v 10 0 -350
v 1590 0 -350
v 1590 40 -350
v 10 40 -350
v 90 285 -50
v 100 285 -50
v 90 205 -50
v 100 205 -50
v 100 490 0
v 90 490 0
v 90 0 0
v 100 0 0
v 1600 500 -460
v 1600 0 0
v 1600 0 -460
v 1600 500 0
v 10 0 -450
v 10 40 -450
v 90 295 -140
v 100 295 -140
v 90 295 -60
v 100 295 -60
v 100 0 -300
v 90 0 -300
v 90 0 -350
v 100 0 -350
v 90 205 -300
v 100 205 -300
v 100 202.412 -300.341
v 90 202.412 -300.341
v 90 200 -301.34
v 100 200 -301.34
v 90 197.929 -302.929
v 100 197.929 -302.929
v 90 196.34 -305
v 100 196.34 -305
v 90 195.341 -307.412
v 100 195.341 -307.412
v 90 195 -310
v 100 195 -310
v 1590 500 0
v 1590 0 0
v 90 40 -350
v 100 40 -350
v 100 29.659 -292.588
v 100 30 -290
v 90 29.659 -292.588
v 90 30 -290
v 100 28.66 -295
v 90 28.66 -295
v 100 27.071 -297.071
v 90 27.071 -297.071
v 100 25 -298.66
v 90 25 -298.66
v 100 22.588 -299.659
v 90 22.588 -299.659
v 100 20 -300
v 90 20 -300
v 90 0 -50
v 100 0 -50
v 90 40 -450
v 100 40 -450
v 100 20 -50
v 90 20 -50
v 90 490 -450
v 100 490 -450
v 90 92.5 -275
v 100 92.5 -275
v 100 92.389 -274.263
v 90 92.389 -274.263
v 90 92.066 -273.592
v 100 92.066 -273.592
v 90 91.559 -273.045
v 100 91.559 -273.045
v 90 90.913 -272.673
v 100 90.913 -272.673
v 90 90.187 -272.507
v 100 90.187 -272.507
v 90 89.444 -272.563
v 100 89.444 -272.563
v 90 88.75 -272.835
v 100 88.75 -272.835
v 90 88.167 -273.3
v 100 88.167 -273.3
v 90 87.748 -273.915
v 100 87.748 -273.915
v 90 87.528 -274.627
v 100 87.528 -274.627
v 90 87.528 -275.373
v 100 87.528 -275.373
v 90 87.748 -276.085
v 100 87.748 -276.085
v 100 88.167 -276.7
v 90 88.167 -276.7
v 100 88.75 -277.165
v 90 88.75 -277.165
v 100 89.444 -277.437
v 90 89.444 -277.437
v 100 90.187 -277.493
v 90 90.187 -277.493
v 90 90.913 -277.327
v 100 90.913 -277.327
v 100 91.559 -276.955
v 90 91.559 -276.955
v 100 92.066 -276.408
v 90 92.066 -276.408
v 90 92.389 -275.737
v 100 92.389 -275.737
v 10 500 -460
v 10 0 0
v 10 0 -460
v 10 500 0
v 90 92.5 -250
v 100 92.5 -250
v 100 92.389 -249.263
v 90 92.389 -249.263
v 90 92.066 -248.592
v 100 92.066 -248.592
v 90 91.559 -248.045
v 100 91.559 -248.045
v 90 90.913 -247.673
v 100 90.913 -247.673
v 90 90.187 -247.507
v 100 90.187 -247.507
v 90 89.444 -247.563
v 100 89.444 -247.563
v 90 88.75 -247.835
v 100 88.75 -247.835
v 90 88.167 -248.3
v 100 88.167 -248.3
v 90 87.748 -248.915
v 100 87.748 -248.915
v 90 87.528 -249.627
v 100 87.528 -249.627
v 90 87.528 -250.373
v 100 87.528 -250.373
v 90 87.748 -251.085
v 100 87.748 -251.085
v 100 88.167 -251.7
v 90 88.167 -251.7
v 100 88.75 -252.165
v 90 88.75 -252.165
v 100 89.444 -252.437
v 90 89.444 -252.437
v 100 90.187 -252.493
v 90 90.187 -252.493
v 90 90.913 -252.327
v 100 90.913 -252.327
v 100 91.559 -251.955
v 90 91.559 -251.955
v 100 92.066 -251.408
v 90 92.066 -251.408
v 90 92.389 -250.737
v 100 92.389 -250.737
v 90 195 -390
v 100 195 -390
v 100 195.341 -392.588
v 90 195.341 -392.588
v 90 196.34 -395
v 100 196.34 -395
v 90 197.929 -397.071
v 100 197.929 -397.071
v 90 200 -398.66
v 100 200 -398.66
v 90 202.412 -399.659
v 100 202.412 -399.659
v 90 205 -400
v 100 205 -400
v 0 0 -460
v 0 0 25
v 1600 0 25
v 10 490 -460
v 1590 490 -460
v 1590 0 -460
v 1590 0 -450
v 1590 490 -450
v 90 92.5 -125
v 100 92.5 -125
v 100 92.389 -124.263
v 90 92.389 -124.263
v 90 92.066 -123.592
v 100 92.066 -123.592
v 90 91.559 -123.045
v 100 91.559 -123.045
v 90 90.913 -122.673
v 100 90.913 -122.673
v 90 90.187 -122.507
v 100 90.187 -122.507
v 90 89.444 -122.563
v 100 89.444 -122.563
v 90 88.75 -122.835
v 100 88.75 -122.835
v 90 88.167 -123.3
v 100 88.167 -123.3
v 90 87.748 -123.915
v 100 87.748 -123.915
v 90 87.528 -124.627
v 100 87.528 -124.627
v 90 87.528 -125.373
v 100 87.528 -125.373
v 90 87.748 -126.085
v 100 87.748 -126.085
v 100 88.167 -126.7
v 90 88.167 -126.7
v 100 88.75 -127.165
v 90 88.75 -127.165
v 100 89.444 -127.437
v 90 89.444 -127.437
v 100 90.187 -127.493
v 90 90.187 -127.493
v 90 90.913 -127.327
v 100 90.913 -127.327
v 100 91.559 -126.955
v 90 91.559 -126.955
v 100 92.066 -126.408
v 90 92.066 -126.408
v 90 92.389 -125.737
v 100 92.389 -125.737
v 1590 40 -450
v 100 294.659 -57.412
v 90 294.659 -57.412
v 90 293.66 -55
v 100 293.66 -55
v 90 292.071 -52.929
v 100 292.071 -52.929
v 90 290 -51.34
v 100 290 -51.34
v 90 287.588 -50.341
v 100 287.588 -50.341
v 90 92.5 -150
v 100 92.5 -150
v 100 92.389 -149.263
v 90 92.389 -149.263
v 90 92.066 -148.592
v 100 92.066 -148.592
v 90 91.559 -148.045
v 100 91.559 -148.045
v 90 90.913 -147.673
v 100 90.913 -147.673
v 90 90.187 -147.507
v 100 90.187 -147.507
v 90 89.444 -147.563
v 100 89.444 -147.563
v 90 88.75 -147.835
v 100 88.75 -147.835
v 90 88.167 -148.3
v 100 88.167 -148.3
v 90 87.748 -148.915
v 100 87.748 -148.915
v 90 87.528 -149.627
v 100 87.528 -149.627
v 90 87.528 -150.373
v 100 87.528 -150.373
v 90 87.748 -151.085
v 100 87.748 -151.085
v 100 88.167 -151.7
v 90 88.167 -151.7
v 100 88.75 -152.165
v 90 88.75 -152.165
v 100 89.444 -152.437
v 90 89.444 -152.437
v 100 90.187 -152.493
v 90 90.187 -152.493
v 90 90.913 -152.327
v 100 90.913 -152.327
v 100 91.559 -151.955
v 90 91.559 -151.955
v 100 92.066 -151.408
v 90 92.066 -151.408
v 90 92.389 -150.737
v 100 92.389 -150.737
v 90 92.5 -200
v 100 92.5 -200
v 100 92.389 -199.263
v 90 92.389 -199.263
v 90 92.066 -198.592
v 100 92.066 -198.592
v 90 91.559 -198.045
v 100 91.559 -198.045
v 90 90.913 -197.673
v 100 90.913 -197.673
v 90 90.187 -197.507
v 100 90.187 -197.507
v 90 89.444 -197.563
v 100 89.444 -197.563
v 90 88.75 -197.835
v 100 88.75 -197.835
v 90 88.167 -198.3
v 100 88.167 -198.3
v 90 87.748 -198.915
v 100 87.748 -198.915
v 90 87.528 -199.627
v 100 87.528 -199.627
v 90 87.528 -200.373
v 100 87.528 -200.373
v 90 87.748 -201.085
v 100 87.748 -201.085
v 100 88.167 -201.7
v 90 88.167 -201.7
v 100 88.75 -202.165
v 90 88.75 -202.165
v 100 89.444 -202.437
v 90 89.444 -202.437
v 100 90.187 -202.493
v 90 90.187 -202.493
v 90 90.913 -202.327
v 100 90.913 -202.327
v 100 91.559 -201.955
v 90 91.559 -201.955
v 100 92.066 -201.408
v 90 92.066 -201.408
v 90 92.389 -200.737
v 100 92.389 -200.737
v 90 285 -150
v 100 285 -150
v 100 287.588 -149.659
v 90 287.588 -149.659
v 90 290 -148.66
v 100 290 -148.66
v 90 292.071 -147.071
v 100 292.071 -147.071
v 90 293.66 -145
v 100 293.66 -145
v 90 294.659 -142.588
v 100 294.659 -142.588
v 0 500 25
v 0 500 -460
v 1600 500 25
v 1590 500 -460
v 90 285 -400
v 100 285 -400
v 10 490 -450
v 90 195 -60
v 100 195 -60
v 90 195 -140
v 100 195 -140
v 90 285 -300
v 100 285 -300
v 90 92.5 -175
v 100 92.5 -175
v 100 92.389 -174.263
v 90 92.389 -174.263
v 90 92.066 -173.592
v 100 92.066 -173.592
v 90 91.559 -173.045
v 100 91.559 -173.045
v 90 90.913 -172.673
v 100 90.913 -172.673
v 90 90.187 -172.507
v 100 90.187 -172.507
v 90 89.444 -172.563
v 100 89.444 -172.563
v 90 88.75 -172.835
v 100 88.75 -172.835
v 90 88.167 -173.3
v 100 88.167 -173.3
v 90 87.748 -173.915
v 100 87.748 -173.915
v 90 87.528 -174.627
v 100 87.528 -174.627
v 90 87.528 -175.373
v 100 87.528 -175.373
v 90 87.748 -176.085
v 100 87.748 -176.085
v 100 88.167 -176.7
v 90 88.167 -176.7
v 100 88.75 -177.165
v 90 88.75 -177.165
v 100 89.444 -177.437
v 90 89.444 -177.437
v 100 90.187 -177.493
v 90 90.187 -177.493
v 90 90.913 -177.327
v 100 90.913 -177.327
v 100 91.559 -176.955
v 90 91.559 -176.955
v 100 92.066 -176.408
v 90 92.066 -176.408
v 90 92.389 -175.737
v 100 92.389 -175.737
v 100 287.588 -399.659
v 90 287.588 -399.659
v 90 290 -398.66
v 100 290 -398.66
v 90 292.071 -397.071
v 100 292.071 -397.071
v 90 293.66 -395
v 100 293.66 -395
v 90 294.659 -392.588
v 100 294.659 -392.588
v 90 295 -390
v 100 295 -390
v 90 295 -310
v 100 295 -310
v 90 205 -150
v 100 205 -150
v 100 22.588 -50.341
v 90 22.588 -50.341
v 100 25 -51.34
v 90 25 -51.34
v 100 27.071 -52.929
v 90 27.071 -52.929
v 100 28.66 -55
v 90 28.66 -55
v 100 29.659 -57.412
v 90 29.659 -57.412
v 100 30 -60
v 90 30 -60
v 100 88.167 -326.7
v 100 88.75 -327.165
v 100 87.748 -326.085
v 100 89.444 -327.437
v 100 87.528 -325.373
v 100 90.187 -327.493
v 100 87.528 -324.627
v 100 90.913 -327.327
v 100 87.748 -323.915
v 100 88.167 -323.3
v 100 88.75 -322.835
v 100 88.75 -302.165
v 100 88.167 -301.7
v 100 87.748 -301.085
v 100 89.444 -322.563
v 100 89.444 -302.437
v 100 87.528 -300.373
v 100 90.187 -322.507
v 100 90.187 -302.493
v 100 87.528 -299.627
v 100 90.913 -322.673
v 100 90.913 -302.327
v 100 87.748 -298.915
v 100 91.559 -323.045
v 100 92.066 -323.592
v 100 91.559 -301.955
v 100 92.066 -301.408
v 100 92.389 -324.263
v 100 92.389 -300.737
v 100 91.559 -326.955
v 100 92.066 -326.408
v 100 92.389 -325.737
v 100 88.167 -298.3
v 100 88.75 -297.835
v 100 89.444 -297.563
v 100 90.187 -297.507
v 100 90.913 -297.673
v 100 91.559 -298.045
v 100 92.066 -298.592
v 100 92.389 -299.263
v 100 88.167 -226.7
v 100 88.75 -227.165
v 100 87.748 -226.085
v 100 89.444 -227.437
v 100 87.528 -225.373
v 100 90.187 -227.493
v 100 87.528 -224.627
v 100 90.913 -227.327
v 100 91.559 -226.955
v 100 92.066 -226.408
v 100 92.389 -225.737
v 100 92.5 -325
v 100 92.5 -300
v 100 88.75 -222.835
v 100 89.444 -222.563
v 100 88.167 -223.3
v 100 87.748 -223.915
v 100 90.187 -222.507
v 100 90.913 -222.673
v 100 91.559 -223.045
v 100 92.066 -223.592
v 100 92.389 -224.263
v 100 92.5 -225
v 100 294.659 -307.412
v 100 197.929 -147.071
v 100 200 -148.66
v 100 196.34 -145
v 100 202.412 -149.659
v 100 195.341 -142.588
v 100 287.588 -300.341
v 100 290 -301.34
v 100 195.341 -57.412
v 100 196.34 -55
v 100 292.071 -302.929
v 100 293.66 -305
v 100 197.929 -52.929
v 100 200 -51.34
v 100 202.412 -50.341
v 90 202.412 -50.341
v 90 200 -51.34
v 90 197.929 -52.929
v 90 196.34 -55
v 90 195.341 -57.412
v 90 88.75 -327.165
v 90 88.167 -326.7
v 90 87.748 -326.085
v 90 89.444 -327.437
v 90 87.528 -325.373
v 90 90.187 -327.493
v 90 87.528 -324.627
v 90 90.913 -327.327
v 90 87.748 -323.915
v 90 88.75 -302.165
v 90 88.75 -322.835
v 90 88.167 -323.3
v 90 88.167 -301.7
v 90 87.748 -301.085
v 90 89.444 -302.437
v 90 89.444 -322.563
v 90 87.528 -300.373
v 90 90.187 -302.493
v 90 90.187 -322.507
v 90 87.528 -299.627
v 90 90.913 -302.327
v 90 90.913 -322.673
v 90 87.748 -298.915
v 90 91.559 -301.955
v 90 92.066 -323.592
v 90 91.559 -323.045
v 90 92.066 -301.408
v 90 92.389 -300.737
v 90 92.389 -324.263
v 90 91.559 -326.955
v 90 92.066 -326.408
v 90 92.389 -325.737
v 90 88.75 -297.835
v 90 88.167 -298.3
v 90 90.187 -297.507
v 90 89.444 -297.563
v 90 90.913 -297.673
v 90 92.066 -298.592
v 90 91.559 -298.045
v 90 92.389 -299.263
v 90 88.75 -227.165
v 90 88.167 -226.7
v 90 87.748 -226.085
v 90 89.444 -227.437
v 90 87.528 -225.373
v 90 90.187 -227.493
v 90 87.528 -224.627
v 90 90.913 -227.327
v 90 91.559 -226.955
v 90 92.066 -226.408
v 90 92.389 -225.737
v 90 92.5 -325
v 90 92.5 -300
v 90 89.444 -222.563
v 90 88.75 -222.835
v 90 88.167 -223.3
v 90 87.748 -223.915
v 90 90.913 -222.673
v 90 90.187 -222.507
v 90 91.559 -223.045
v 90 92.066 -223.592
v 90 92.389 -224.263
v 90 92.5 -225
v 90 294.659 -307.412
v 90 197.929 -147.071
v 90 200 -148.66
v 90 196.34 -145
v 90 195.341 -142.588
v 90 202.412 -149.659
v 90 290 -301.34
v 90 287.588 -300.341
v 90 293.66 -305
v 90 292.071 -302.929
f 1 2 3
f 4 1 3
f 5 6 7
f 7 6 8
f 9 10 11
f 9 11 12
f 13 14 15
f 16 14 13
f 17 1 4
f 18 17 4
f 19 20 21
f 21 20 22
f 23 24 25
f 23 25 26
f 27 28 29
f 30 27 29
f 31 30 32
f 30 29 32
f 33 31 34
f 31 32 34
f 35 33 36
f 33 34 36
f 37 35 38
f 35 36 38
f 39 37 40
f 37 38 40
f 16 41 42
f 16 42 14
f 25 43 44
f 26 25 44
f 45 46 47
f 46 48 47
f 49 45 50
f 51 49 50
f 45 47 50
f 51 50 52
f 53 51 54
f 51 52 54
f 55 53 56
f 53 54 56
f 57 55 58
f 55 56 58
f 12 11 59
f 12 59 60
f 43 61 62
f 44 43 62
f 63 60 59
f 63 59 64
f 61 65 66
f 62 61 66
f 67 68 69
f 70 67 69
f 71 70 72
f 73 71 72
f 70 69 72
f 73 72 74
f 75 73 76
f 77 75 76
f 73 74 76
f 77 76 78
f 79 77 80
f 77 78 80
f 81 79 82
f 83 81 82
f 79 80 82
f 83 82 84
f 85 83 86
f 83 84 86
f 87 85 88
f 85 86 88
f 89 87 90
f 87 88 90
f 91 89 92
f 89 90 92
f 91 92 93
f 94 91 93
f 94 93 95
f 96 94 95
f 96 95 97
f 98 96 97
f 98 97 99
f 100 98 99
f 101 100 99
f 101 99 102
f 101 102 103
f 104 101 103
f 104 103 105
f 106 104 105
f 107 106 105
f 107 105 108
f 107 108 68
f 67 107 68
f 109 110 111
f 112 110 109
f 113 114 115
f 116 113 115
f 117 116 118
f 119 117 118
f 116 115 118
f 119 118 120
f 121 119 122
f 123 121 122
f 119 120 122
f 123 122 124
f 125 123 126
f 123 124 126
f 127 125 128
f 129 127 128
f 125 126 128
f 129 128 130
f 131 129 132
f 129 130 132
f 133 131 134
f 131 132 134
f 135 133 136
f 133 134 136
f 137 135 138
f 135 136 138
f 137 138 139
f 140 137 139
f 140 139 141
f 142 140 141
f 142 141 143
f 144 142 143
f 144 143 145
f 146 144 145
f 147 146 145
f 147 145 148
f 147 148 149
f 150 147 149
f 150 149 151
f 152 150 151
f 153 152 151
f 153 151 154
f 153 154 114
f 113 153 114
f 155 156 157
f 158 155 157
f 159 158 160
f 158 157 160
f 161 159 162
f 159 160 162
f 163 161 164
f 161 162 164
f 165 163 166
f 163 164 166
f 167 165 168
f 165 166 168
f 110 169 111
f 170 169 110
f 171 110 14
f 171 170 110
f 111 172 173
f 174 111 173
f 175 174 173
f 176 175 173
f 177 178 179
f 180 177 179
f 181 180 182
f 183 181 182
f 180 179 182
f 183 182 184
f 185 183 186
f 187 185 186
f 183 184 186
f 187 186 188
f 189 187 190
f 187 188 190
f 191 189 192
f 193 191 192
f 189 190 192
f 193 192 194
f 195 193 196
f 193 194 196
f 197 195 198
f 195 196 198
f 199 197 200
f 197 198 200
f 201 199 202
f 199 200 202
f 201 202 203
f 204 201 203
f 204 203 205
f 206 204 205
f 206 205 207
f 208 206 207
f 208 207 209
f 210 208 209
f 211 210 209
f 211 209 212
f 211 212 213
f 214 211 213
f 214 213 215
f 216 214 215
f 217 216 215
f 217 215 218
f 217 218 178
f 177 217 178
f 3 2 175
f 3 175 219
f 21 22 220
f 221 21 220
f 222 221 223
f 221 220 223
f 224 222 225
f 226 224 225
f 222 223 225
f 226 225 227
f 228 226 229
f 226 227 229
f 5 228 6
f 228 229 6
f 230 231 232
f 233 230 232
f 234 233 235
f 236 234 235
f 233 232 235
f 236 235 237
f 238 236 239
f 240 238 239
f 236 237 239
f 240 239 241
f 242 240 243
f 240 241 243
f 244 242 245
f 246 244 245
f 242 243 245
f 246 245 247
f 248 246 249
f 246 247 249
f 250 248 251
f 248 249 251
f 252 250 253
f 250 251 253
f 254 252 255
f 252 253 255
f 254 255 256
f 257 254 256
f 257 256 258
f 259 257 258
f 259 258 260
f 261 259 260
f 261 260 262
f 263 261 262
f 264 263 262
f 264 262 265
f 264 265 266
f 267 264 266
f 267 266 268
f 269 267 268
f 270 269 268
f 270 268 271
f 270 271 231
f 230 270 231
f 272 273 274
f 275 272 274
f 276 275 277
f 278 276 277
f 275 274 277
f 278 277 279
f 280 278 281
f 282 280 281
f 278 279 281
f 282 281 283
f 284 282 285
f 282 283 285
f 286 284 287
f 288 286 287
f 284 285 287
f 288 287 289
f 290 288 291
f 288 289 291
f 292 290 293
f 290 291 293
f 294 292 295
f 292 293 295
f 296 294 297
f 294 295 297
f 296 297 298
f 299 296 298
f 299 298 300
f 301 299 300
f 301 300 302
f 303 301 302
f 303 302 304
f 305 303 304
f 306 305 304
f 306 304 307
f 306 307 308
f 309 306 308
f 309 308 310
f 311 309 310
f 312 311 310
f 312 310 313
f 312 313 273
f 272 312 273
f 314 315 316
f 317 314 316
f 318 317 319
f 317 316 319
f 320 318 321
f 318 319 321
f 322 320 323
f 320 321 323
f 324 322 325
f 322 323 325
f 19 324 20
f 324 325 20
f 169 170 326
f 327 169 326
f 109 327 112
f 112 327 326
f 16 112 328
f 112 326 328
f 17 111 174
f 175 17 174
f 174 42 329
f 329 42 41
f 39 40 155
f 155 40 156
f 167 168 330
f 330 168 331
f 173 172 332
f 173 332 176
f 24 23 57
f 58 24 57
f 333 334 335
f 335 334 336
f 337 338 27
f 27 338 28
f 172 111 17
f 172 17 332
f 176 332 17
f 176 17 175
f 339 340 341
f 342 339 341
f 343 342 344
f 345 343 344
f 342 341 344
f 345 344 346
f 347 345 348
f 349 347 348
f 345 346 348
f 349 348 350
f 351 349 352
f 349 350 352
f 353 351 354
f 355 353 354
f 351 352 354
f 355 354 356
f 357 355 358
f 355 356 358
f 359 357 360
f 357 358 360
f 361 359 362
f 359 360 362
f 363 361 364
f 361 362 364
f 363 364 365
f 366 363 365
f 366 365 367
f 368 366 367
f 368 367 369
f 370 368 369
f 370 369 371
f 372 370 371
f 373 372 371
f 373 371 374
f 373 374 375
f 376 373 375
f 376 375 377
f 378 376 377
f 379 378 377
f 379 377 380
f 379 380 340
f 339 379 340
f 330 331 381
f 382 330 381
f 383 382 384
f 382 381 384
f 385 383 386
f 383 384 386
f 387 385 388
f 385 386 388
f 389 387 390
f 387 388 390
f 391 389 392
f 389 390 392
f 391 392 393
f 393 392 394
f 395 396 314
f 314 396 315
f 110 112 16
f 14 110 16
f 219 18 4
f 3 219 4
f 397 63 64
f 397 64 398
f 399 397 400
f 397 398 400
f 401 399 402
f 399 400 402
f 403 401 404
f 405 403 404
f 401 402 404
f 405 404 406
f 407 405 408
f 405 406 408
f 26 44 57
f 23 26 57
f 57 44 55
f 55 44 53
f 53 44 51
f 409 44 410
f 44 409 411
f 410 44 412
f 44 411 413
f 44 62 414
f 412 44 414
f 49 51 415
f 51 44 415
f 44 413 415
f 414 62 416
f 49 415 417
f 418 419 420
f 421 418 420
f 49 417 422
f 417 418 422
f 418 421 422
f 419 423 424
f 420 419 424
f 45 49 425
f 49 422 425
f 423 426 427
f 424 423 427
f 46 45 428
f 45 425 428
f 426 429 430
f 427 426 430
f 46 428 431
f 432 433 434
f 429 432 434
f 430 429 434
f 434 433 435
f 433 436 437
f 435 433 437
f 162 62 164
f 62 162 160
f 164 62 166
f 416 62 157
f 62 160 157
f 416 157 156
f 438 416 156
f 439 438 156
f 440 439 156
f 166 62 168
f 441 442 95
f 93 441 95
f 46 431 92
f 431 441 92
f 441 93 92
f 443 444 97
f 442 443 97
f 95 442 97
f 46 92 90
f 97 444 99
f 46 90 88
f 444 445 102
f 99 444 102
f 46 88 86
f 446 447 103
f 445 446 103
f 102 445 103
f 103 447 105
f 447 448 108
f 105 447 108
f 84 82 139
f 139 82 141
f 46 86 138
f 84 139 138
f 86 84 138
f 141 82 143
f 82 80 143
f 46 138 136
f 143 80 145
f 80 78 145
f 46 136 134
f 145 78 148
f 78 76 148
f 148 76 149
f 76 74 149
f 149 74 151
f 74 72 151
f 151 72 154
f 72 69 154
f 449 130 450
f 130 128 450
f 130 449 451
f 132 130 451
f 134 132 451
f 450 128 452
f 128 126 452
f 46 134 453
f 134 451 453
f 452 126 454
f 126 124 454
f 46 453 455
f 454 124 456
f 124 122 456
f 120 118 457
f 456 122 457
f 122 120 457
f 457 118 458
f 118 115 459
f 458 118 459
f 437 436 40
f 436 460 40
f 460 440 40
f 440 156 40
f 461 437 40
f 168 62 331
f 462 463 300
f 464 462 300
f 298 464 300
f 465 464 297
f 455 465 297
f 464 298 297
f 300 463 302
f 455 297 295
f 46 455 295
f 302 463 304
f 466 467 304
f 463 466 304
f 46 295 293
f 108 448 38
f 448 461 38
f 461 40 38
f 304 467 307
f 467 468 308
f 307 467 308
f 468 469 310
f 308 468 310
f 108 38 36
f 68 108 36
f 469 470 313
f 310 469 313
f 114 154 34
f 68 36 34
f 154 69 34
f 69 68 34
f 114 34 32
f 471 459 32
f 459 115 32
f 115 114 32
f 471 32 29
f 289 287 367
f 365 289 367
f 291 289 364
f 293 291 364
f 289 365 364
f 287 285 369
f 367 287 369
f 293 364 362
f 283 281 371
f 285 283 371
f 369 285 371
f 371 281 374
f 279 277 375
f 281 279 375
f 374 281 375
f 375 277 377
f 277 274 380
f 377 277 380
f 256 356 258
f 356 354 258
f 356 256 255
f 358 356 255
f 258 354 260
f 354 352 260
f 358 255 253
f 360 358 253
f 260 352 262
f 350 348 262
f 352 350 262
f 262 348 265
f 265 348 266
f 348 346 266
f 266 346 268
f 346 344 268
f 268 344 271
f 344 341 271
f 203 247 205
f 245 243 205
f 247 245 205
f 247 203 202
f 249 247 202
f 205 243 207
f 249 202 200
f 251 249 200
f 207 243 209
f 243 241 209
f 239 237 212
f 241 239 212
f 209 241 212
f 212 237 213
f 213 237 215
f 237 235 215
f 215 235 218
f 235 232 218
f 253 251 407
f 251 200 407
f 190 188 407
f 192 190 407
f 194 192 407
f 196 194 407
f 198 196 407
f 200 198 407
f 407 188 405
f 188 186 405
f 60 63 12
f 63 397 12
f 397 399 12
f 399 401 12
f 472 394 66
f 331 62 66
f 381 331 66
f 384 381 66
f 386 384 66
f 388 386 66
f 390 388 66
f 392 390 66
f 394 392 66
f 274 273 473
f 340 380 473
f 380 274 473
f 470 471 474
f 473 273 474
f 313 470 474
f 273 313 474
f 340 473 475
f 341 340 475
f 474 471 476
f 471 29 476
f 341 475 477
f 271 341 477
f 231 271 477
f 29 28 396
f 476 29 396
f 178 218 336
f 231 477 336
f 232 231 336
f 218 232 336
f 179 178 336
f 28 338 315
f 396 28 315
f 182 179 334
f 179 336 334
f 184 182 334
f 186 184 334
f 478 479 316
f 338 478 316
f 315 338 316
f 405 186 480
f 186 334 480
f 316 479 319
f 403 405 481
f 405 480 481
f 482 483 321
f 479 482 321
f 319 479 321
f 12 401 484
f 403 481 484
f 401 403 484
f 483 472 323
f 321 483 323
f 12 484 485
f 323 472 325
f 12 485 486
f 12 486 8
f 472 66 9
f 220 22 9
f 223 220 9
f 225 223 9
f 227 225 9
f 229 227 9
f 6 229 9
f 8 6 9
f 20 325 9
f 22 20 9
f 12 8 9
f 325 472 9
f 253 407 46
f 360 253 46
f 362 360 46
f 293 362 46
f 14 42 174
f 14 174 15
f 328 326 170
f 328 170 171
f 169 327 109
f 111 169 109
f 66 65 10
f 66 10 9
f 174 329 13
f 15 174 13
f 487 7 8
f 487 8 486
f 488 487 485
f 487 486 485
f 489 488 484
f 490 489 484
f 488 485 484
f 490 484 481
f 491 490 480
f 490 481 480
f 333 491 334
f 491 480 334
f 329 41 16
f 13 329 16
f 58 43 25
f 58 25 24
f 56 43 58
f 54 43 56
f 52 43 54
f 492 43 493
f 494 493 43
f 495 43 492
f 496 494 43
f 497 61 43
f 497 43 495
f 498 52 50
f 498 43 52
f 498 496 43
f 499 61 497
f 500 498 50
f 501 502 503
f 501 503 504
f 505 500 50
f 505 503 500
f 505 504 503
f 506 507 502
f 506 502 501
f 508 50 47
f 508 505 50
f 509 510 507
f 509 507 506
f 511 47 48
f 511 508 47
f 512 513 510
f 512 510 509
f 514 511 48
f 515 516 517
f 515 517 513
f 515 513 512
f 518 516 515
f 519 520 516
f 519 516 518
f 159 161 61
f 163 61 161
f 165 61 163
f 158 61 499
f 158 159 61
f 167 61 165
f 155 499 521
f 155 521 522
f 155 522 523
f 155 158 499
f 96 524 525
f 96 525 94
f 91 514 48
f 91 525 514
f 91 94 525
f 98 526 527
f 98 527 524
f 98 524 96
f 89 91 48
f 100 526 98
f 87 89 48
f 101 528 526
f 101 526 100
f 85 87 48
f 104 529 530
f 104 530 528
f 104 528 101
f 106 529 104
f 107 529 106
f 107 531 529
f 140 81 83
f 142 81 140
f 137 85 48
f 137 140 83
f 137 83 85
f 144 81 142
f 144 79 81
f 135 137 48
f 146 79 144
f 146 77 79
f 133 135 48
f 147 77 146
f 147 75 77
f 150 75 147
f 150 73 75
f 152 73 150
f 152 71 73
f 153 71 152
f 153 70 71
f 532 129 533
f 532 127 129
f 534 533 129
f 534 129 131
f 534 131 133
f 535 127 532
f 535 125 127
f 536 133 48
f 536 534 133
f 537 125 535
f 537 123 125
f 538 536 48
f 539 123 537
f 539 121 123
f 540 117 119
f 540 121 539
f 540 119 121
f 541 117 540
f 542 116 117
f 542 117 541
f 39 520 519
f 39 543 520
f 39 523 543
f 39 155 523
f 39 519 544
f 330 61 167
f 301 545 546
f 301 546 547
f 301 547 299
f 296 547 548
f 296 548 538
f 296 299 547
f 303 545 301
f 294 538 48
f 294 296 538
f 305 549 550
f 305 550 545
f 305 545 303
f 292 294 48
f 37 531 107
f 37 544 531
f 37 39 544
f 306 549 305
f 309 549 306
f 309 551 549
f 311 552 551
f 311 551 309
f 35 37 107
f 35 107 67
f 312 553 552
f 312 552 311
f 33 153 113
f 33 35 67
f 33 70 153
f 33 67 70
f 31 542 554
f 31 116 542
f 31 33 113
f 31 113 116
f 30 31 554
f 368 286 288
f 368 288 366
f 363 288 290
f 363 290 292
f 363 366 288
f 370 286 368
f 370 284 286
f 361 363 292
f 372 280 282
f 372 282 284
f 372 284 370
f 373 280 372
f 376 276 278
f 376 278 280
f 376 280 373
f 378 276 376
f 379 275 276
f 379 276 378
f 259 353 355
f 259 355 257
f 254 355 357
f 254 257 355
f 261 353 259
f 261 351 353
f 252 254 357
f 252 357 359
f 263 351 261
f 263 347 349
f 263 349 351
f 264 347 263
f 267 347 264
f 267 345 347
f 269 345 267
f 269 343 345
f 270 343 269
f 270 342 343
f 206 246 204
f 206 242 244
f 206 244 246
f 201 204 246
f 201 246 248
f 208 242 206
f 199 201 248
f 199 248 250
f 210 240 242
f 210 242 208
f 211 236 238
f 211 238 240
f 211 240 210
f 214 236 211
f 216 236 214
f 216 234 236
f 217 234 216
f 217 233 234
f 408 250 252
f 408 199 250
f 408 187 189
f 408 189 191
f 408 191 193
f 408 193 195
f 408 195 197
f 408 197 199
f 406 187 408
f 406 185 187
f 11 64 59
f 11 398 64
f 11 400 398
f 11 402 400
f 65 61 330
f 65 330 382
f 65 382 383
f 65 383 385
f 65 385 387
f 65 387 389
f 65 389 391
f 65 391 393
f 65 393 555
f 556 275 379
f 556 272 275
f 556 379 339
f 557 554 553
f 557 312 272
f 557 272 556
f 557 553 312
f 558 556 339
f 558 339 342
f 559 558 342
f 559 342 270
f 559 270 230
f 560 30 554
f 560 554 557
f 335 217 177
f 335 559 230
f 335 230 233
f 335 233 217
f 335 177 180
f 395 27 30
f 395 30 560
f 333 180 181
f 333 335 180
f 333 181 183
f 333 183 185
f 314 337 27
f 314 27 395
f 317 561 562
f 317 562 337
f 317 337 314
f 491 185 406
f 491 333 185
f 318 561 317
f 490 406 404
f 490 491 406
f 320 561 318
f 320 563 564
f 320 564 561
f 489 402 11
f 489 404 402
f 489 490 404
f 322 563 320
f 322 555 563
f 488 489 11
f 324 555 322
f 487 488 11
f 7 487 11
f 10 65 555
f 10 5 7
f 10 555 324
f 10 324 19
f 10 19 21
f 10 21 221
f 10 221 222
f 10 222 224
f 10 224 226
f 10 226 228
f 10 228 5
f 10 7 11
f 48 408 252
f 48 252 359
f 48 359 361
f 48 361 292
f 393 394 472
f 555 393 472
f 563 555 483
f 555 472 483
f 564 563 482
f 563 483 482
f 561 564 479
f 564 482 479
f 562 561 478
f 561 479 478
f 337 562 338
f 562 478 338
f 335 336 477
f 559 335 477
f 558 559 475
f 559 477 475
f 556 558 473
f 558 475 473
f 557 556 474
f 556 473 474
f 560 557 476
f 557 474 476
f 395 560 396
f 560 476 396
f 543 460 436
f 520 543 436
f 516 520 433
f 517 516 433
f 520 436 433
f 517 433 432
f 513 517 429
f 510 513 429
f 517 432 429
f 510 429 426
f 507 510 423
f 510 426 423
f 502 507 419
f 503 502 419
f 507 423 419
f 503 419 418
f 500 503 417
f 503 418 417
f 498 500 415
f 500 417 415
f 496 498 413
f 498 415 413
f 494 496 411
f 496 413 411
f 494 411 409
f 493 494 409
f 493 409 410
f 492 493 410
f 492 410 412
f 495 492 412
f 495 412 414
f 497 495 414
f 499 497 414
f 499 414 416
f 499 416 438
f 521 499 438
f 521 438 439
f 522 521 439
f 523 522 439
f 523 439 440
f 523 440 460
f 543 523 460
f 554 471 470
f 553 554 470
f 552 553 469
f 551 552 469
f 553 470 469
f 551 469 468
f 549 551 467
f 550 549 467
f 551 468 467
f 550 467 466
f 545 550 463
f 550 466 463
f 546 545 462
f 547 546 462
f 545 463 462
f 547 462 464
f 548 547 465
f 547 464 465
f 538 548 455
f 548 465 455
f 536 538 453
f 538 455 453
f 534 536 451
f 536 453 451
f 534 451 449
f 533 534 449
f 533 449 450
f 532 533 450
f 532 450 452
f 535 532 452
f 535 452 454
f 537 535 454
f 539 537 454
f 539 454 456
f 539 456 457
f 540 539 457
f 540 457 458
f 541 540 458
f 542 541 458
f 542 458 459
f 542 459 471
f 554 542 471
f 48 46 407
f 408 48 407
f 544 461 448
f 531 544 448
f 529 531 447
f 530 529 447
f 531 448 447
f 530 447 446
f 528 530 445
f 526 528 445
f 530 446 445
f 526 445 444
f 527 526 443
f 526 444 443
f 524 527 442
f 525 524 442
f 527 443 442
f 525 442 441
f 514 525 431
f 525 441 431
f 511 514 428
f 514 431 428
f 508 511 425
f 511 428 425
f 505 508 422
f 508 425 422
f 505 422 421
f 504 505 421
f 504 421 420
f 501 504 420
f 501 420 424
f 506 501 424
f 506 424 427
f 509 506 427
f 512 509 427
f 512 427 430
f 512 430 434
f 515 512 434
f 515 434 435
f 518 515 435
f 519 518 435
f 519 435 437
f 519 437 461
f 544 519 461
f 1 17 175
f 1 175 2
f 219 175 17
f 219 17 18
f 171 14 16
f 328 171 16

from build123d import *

# Parameters (mm, degrees)
F0_W      = 1600
F0_H      = 500
F1_DEPTH  = 25
F3_W      = 1580
F3_H      = 490
F4_DEPTH  = 10
F5_W      = 10
F5_H      = 500
F6_DEPTH  = 460
F7_W      = 10
F7_H      = 500
F8_DEPTH  = 460
F9_W      = 40
F9_H      = 100
F10_DEPTH = 1580
F11_W     = 10
F11_H     = 450
F12_DEPTH = 450
F13_W     = 10
F13_H     = 350
F14_DEPTH = 40
F16_W     = 30
F16_H     = 250
F17_DEPTH = 100.001
F18_R     = 10
F20_DEPTH = 100.001
F21_R     = 2.5
F22_DEPTH = 100.001


with BuildPart() as f1:
    # F0 (on Top) → F1 (new body)
    with BuildSketch(Plane.XY):
        with Locations((800, 250)):
            Rectangle(F0_W, F0_H)
    extrude(amount=F1_DEPTH)

    # F5 (on face) → F6 (join, through all)
    with BuildSketch(Plane.XY):
        with Locations((5, 250)):
            Rectangle(F5_W, F5_H)
    extrude(amount=-F6_DEPTH)


with BuildPart() as f4:
    # F3 (on offset) → F4 (new body)
    with BuildSketch(Plane.XY.offset(-460)):
        with Locations((800, 245)):
            Rectangle(F3_W, F3_H)
    extrude(amount=F4_DEPTH)


with BuildPart() as f8:
    # F7 (on face) → F8 (new body, through all)
    with BuildSketch(Plane.XY):
        with Locations((1595, 250)):
            Rectangle(F7_W, F7_H)
    extrude(amount=-F8_DEPTH)


with BuildPart() as f10:
    # F9 (on face) → F10 (new body, through all)
    with BuildSketch(Plane.YZ.offset(10)):
        with Locations((20, -400)):
            Rectangle(F9_W, F9_H)
    extrude(amount=F10_DEPTH)


with BuildPart() as f12:
    # F11 (on face) → F12 (new body, through all)
    with BuildSketch(Plane.XY.offset(-450)):
        with Locations((95, 265)):
            Rectangle(F11_W, F11_H)
    extrude(amount=F12_DEPTH)

    # F13 (on face) → F14 (join, through all)
    with BuildSketch(Plane.XZ.offset(-40)):
        with Locations((95, -175)):
            Rectangle(F13_W, F13_H)
    extrude(amount=F14_DEPTH)

    # F15: union 

    # F16 (on face) → F17 (cut, through all)
    with BuildSketch(Plane.YZ.offset(100)):
        with Locations((15, -175)):
            Rectangle(F16_W, F16_H)
    extrude(amount=-F17_DEPTH, mode=Mode.SUBTRACT)

    # F18
    f18_edges = [f12.edges().sort_by_distance(p)[0] for p in [
        (95, 30, -50),
        (95, 30, -300),
    ]]
    fillet(f18_edges, radius=F18_R)

    # F19 (on face) → F20 (cut, through all)
    with BuildSketch(Plane.YZ.offset(100)):
        with BuildLine():
            Line((285, -50), (205, -50))
            ThreePointArc((205, -50), (197.9289321881, -52.9289321881), (195, -60))
            Line((195, -60), (195, -140))
            ThreePointArc((195, -140), (197.9289321881, -147.0710678119), (205, -150))
            Line((205, -150), (285, -150))
            ThreePointArc((285, -150), (292.0710678119, -147.0710678119), (295, -140))
            Line((295, -140), (295, -60))
            ThreePointArc((295, -60), (292.0710678119, -52.9289321881), (285, -50))
        make_face()
        with BuildLine():
            Line((285, -300), (205, -300))
            ThreePointArc((205, -300), (197.9289321881, -302.9289321881), (195, -310))
            Line((195, -310), (195, -390))
            ThreePointArc((195, -390), (197.9289321881, -397.0710678119), (205, -400))
            Line((205, -400), (285, -400))
            ThreePointArc((285, -400), (292.0710678119, -397.0710678119), (295, -390))
            Line((295, -390), (295, -310))
            ThreePointArc((295, -310), (292.0710678119, -302.9289321881), (285, -300))
        make_face()
    extrude(amount=-F20_DEPTH, mode=Mode.SUBTRACT)

    # F21 (on face) → F22 (cut, through all)
    with BuildSketch(Plane.YZ.offset(100)):
        with Locations((90, -325)):
            Circle(F21_R)
        with Locations((90, -300)):
            Circle(F21_R)
        with Locations((90, -275)):
            Circle(F21_R)
        with Locations((90, -250)):
            Circle(F21_R)
        with Locations((90, -225)):
            Circle(F21_R)
        with Locations((90, -200)):
            Circle(F21_R)
        with Locations((90, -175)):
            Circle(F21_R)
        with Locations((90, -150)):
            Circle(F21_R)
        with Locations((90, -125)):
            Circle(F21_R)
    extrude(amount=-F22_DEPTH, mode=Mode.SUBTRACT)


solid = Compound([f1.part, f4.part, f8.part, f10.part, f12.part])
